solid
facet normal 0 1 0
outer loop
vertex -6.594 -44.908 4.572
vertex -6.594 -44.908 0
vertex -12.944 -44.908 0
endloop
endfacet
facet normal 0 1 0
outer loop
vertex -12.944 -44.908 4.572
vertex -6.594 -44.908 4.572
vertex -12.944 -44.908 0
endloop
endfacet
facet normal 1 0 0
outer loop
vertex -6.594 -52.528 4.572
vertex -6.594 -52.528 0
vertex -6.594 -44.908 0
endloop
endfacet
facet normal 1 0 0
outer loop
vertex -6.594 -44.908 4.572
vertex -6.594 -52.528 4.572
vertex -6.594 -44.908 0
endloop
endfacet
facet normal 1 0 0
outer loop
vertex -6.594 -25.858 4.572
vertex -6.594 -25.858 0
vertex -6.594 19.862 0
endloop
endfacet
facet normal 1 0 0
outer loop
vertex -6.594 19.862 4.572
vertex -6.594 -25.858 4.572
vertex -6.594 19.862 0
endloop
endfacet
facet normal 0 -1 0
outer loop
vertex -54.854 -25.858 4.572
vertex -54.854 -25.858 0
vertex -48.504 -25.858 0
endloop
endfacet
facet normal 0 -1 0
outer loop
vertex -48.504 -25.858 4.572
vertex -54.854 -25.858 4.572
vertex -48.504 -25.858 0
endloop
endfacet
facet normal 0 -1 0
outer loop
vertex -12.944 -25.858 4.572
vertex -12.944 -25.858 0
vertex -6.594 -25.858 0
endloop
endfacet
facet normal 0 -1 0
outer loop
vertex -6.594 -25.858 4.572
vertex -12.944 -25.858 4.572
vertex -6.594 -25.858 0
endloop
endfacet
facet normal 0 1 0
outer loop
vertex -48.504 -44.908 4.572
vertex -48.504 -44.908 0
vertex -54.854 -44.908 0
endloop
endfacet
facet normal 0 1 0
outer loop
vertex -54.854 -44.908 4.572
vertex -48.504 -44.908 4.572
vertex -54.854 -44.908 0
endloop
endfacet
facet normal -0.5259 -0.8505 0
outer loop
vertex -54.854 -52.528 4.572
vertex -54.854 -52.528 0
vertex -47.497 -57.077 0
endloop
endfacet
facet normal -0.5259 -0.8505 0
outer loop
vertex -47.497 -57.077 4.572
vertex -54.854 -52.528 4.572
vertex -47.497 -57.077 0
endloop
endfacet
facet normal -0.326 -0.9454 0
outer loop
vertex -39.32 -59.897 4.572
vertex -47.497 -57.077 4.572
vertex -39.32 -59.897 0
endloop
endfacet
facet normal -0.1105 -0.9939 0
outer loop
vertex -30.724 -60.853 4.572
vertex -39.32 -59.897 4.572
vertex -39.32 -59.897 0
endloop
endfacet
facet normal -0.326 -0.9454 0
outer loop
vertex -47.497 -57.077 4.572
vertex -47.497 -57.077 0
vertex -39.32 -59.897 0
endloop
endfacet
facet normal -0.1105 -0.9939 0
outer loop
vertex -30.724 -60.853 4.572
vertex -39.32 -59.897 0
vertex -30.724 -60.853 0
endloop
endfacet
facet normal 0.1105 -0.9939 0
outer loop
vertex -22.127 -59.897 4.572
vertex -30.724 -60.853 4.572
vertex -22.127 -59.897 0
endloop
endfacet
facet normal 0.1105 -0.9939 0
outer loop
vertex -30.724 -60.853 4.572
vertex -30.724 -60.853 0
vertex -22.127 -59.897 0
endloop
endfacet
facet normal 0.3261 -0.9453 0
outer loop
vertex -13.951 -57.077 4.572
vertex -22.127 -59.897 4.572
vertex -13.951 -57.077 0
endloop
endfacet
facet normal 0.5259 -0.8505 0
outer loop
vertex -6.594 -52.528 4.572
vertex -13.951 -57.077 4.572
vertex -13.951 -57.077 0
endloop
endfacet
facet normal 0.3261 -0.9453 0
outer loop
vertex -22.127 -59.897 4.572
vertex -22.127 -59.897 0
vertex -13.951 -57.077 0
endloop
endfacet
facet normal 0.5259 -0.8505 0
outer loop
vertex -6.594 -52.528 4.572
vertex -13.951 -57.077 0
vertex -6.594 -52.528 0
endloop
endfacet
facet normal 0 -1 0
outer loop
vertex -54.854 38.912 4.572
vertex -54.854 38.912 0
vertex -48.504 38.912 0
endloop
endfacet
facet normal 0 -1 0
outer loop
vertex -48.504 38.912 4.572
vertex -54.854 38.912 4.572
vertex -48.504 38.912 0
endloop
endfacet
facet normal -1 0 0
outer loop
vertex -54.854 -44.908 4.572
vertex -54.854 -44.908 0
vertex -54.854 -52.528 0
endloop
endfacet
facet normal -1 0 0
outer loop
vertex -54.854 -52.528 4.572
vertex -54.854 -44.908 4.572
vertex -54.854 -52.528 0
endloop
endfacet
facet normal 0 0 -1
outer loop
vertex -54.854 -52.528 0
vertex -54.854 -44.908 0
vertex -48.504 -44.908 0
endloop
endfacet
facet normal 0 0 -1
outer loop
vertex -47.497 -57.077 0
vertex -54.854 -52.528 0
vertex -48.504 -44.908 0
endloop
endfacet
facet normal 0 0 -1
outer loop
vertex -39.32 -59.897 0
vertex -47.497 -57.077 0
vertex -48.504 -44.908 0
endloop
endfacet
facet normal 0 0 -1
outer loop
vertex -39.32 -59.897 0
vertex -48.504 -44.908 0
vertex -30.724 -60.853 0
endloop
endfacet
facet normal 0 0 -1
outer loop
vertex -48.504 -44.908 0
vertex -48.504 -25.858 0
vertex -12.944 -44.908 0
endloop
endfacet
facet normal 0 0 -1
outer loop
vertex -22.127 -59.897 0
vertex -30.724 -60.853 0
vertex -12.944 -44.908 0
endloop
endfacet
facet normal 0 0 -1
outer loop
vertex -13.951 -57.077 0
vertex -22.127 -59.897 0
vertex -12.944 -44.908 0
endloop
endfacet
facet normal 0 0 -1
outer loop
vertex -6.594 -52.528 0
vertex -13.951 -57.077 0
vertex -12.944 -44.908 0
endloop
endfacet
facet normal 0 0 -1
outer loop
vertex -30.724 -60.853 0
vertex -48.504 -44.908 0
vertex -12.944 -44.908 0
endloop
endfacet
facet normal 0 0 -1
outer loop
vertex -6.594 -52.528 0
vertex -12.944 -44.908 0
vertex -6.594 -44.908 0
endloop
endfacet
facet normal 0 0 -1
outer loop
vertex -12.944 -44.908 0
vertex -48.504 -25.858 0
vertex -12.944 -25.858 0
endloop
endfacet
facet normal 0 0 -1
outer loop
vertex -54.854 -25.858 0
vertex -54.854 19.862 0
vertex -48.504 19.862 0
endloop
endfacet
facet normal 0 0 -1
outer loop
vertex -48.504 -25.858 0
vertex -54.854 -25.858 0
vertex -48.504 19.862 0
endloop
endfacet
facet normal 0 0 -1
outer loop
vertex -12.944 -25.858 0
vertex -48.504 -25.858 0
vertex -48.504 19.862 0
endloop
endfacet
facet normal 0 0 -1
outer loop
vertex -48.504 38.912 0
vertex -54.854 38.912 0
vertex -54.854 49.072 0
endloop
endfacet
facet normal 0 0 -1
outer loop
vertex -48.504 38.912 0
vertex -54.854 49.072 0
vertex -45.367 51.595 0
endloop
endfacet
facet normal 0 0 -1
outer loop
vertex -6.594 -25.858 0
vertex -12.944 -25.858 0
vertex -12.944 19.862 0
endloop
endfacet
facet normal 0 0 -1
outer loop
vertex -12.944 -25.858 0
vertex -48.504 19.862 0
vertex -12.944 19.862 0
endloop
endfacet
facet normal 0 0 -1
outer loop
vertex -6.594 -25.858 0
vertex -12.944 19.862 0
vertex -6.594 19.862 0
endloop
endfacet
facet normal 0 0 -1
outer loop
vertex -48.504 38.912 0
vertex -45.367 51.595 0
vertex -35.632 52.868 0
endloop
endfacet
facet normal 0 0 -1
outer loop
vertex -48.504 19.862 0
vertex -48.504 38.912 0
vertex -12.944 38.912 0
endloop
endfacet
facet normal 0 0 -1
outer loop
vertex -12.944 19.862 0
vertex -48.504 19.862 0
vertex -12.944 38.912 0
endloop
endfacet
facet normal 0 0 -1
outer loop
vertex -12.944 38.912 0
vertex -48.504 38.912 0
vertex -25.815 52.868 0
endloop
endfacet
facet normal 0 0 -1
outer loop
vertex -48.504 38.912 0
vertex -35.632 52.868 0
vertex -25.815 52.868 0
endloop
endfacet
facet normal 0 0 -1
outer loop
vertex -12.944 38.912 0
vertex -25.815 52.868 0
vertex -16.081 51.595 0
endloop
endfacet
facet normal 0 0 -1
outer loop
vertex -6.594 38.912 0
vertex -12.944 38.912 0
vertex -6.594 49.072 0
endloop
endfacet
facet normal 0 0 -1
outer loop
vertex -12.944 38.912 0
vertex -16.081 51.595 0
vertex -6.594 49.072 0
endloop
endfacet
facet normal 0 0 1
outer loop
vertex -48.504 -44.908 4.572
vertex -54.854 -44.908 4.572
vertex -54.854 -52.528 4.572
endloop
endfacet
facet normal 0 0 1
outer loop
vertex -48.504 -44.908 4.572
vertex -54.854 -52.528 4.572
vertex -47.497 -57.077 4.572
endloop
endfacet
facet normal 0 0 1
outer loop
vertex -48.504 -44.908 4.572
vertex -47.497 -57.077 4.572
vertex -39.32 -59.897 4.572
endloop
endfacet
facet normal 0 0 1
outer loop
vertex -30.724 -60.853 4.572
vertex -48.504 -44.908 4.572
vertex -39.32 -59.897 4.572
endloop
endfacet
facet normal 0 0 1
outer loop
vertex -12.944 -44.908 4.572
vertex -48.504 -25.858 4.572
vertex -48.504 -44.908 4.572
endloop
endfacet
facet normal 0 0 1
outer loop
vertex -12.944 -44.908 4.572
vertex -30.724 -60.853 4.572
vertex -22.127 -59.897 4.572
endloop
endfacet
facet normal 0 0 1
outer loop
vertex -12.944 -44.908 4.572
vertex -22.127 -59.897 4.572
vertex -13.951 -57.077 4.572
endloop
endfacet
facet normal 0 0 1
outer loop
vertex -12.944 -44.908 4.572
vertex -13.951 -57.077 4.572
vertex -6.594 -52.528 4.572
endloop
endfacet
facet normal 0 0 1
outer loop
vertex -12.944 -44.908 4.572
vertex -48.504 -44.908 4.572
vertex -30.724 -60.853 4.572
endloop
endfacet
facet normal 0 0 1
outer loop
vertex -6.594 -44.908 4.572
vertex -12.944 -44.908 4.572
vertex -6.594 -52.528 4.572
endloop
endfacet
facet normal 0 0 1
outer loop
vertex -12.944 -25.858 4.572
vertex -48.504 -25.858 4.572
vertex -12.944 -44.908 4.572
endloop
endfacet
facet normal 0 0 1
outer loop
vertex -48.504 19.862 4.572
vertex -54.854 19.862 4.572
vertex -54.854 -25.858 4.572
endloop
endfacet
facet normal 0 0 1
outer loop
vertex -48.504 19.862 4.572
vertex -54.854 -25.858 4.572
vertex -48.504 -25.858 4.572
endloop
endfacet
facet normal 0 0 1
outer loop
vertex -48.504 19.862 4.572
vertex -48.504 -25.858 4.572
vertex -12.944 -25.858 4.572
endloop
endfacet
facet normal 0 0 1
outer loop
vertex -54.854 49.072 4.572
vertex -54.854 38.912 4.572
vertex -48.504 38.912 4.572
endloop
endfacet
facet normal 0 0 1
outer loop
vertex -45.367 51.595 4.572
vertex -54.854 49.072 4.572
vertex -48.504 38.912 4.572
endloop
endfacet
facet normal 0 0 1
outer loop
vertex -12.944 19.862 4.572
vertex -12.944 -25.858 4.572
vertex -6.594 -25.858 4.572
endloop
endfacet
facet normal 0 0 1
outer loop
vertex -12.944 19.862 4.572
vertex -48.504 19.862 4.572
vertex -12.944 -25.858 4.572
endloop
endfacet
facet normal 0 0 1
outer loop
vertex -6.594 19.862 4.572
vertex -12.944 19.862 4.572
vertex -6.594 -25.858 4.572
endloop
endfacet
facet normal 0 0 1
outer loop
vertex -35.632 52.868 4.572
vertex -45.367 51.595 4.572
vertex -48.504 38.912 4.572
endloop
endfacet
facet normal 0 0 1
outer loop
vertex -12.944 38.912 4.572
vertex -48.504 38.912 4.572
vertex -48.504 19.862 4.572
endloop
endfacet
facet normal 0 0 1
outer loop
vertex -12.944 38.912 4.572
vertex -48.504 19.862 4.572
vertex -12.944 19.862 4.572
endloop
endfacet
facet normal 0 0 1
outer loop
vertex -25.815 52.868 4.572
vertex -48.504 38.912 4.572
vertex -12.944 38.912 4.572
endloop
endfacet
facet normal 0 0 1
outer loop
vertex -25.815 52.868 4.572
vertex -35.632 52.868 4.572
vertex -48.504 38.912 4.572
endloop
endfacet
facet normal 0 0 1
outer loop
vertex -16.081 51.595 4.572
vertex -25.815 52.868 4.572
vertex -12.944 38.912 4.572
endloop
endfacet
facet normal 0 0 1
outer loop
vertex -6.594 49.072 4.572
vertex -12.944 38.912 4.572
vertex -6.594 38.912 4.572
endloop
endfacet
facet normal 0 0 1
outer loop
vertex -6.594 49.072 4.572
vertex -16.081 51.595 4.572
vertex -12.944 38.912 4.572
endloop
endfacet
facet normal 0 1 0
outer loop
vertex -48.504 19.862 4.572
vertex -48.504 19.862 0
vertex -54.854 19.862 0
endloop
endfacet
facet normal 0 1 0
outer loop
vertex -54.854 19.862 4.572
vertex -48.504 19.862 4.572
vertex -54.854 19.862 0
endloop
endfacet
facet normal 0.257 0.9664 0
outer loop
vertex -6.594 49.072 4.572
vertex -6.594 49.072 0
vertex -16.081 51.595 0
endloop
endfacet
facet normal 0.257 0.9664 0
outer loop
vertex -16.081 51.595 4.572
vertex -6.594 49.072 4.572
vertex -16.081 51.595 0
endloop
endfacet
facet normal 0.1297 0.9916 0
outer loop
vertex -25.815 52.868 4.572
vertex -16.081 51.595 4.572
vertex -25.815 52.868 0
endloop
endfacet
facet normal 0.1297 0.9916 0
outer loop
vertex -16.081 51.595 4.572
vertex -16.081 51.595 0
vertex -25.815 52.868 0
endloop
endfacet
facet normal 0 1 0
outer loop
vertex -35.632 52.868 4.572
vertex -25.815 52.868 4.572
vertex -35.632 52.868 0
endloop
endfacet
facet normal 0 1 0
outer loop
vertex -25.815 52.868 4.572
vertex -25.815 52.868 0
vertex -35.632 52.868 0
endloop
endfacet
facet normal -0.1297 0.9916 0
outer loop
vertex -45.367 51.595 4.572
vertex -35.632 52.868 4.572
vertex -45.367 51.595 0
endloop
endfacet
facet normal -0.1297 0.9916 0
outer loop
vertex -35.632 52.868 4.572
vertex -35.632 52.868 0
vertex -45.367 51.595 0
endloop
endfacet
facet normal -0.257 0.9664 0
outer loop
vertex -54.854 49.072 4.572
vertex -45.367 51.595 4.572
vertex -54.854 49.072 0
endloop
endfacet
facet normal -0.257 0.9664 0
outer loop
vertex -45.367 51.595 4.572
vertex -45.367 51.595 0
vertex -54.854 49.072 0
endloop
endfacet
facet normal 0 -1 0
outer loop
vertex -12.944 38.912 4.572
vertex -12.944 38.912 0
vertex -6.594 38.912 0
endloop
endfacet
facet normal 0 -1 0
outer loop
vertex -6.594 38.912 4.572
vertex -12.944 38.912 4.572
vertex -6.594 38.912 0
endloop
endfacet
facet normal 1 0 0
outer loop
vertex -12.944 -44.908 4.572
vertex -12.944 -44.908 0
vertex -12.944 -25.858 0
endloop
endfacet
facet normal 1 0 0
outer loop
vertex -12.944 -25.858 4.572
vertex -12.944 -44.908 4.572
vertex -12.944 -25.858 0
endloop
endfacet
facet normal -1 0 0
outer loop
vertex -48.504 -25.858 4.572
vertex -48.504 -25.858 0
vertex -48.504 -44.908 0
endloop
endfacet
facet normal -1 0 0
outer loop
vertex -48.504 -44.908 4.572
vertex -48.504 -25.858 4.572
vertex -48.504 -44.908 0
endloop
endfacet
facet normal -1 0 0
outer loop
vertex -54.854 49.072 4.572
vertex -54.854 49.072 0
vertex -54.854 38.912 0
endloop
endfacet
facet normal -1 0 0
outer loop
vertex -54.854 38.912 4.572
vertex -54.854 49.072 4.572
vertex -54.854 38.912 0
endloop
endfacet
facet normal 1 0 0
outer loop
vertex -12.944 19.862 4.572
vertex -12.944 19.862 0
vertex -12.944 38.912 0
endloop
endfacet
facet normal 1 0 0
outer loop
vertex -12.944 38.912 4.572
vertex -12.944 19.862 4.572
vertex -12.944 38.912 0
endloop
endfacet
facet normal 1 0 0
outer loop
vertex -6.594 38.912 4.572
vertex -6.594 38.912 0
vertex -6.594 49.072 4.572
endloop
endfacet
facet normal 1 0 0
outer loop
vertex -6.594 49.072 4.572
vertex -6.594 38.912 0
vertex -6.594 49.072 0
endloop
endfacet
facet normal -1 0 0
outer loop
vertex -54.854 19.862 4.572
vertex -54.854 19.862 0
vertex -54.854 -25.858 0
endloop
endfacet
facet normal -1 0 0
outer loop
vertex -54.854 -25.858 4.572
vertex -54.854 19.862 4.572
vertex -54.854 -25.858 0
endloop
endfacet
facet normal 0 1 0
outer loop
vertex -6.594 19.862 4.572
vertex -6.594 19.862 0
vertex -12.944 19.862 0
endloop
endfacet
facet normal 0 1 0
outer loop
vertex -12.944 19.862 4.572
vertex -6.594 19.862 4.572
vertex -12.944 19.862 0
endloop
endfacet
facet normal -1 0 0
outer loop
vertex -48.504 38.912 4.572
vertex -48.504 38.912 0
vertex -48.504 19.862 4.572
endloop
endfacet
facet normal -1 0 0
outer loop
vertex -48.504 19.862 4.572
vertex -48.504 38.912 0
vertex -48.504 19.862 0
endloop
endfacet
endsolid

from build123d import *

# Parameters (mm, degrees)
F1_DEPTH = 4.572


with BuildPart() as f1:
    # F0 (on Top) → F1 (new body)
    with BuildSketch(Plane.XY):
        with BuildLine():
            ThreePointArc((-6.593841, 49.071565), (-30.72384, 53.027217), (-54.85384, 49.071565))
            Line((-54.85384, 49.071565), (-54.85384, 38.911565))
            Line((-54.85384, 38.911565), (-48.50384, 38.911565))
            Line((-48.50384, 38.911565), (-48.50384, 19.861565))
            Line((-48.50384, 19.861565), (-54.85384, 19.861565))
            Line((-54.85384, 19.861565), (-54.85384, -25.858435))
            Line((-54.85384, -25.858435), (-48.50384, -25.858435))
            Line((-48.50384, -25.858435), (-48.50384, -44.908435))
            Line((-48.50384, -44.908435), (-54.85384, -44.908435))
            Line((-54.85384, -44.908435), (-54.85384, -52.528435))
            ThreePointArc((-54.85384, -52.528435), (-30.72384, -60.853284), (-6.593841, -52.528435))
            Line((-6.593841, -52.528435), (-6.593841, -44.908435))
            Line((-6.593841, -44.908435), (-12.943841, -44.908435))
            Line((-12.943841, -44.908435), (-12.943841, -25.858435))
            Line((-12.943841, -25.858435), (-6.593841, -25.858435))
            Line((-6.593841, -25.858435), (-6.593841, 19.861565))
            Line((-6.593841, 19.861565), (-12.943841, 19.861565))
            Line((-12.943841, 19.861565), (-12.943841, 38.911565))
            Line((-12.943841, 38.911565), (-6.593841, 38.911565))
            Line((-6.593841, 38.911565), (-6.593841, 49.071565))
        make_face()
    extrude(amount=F1_DEPTH)


solid = f1.part
